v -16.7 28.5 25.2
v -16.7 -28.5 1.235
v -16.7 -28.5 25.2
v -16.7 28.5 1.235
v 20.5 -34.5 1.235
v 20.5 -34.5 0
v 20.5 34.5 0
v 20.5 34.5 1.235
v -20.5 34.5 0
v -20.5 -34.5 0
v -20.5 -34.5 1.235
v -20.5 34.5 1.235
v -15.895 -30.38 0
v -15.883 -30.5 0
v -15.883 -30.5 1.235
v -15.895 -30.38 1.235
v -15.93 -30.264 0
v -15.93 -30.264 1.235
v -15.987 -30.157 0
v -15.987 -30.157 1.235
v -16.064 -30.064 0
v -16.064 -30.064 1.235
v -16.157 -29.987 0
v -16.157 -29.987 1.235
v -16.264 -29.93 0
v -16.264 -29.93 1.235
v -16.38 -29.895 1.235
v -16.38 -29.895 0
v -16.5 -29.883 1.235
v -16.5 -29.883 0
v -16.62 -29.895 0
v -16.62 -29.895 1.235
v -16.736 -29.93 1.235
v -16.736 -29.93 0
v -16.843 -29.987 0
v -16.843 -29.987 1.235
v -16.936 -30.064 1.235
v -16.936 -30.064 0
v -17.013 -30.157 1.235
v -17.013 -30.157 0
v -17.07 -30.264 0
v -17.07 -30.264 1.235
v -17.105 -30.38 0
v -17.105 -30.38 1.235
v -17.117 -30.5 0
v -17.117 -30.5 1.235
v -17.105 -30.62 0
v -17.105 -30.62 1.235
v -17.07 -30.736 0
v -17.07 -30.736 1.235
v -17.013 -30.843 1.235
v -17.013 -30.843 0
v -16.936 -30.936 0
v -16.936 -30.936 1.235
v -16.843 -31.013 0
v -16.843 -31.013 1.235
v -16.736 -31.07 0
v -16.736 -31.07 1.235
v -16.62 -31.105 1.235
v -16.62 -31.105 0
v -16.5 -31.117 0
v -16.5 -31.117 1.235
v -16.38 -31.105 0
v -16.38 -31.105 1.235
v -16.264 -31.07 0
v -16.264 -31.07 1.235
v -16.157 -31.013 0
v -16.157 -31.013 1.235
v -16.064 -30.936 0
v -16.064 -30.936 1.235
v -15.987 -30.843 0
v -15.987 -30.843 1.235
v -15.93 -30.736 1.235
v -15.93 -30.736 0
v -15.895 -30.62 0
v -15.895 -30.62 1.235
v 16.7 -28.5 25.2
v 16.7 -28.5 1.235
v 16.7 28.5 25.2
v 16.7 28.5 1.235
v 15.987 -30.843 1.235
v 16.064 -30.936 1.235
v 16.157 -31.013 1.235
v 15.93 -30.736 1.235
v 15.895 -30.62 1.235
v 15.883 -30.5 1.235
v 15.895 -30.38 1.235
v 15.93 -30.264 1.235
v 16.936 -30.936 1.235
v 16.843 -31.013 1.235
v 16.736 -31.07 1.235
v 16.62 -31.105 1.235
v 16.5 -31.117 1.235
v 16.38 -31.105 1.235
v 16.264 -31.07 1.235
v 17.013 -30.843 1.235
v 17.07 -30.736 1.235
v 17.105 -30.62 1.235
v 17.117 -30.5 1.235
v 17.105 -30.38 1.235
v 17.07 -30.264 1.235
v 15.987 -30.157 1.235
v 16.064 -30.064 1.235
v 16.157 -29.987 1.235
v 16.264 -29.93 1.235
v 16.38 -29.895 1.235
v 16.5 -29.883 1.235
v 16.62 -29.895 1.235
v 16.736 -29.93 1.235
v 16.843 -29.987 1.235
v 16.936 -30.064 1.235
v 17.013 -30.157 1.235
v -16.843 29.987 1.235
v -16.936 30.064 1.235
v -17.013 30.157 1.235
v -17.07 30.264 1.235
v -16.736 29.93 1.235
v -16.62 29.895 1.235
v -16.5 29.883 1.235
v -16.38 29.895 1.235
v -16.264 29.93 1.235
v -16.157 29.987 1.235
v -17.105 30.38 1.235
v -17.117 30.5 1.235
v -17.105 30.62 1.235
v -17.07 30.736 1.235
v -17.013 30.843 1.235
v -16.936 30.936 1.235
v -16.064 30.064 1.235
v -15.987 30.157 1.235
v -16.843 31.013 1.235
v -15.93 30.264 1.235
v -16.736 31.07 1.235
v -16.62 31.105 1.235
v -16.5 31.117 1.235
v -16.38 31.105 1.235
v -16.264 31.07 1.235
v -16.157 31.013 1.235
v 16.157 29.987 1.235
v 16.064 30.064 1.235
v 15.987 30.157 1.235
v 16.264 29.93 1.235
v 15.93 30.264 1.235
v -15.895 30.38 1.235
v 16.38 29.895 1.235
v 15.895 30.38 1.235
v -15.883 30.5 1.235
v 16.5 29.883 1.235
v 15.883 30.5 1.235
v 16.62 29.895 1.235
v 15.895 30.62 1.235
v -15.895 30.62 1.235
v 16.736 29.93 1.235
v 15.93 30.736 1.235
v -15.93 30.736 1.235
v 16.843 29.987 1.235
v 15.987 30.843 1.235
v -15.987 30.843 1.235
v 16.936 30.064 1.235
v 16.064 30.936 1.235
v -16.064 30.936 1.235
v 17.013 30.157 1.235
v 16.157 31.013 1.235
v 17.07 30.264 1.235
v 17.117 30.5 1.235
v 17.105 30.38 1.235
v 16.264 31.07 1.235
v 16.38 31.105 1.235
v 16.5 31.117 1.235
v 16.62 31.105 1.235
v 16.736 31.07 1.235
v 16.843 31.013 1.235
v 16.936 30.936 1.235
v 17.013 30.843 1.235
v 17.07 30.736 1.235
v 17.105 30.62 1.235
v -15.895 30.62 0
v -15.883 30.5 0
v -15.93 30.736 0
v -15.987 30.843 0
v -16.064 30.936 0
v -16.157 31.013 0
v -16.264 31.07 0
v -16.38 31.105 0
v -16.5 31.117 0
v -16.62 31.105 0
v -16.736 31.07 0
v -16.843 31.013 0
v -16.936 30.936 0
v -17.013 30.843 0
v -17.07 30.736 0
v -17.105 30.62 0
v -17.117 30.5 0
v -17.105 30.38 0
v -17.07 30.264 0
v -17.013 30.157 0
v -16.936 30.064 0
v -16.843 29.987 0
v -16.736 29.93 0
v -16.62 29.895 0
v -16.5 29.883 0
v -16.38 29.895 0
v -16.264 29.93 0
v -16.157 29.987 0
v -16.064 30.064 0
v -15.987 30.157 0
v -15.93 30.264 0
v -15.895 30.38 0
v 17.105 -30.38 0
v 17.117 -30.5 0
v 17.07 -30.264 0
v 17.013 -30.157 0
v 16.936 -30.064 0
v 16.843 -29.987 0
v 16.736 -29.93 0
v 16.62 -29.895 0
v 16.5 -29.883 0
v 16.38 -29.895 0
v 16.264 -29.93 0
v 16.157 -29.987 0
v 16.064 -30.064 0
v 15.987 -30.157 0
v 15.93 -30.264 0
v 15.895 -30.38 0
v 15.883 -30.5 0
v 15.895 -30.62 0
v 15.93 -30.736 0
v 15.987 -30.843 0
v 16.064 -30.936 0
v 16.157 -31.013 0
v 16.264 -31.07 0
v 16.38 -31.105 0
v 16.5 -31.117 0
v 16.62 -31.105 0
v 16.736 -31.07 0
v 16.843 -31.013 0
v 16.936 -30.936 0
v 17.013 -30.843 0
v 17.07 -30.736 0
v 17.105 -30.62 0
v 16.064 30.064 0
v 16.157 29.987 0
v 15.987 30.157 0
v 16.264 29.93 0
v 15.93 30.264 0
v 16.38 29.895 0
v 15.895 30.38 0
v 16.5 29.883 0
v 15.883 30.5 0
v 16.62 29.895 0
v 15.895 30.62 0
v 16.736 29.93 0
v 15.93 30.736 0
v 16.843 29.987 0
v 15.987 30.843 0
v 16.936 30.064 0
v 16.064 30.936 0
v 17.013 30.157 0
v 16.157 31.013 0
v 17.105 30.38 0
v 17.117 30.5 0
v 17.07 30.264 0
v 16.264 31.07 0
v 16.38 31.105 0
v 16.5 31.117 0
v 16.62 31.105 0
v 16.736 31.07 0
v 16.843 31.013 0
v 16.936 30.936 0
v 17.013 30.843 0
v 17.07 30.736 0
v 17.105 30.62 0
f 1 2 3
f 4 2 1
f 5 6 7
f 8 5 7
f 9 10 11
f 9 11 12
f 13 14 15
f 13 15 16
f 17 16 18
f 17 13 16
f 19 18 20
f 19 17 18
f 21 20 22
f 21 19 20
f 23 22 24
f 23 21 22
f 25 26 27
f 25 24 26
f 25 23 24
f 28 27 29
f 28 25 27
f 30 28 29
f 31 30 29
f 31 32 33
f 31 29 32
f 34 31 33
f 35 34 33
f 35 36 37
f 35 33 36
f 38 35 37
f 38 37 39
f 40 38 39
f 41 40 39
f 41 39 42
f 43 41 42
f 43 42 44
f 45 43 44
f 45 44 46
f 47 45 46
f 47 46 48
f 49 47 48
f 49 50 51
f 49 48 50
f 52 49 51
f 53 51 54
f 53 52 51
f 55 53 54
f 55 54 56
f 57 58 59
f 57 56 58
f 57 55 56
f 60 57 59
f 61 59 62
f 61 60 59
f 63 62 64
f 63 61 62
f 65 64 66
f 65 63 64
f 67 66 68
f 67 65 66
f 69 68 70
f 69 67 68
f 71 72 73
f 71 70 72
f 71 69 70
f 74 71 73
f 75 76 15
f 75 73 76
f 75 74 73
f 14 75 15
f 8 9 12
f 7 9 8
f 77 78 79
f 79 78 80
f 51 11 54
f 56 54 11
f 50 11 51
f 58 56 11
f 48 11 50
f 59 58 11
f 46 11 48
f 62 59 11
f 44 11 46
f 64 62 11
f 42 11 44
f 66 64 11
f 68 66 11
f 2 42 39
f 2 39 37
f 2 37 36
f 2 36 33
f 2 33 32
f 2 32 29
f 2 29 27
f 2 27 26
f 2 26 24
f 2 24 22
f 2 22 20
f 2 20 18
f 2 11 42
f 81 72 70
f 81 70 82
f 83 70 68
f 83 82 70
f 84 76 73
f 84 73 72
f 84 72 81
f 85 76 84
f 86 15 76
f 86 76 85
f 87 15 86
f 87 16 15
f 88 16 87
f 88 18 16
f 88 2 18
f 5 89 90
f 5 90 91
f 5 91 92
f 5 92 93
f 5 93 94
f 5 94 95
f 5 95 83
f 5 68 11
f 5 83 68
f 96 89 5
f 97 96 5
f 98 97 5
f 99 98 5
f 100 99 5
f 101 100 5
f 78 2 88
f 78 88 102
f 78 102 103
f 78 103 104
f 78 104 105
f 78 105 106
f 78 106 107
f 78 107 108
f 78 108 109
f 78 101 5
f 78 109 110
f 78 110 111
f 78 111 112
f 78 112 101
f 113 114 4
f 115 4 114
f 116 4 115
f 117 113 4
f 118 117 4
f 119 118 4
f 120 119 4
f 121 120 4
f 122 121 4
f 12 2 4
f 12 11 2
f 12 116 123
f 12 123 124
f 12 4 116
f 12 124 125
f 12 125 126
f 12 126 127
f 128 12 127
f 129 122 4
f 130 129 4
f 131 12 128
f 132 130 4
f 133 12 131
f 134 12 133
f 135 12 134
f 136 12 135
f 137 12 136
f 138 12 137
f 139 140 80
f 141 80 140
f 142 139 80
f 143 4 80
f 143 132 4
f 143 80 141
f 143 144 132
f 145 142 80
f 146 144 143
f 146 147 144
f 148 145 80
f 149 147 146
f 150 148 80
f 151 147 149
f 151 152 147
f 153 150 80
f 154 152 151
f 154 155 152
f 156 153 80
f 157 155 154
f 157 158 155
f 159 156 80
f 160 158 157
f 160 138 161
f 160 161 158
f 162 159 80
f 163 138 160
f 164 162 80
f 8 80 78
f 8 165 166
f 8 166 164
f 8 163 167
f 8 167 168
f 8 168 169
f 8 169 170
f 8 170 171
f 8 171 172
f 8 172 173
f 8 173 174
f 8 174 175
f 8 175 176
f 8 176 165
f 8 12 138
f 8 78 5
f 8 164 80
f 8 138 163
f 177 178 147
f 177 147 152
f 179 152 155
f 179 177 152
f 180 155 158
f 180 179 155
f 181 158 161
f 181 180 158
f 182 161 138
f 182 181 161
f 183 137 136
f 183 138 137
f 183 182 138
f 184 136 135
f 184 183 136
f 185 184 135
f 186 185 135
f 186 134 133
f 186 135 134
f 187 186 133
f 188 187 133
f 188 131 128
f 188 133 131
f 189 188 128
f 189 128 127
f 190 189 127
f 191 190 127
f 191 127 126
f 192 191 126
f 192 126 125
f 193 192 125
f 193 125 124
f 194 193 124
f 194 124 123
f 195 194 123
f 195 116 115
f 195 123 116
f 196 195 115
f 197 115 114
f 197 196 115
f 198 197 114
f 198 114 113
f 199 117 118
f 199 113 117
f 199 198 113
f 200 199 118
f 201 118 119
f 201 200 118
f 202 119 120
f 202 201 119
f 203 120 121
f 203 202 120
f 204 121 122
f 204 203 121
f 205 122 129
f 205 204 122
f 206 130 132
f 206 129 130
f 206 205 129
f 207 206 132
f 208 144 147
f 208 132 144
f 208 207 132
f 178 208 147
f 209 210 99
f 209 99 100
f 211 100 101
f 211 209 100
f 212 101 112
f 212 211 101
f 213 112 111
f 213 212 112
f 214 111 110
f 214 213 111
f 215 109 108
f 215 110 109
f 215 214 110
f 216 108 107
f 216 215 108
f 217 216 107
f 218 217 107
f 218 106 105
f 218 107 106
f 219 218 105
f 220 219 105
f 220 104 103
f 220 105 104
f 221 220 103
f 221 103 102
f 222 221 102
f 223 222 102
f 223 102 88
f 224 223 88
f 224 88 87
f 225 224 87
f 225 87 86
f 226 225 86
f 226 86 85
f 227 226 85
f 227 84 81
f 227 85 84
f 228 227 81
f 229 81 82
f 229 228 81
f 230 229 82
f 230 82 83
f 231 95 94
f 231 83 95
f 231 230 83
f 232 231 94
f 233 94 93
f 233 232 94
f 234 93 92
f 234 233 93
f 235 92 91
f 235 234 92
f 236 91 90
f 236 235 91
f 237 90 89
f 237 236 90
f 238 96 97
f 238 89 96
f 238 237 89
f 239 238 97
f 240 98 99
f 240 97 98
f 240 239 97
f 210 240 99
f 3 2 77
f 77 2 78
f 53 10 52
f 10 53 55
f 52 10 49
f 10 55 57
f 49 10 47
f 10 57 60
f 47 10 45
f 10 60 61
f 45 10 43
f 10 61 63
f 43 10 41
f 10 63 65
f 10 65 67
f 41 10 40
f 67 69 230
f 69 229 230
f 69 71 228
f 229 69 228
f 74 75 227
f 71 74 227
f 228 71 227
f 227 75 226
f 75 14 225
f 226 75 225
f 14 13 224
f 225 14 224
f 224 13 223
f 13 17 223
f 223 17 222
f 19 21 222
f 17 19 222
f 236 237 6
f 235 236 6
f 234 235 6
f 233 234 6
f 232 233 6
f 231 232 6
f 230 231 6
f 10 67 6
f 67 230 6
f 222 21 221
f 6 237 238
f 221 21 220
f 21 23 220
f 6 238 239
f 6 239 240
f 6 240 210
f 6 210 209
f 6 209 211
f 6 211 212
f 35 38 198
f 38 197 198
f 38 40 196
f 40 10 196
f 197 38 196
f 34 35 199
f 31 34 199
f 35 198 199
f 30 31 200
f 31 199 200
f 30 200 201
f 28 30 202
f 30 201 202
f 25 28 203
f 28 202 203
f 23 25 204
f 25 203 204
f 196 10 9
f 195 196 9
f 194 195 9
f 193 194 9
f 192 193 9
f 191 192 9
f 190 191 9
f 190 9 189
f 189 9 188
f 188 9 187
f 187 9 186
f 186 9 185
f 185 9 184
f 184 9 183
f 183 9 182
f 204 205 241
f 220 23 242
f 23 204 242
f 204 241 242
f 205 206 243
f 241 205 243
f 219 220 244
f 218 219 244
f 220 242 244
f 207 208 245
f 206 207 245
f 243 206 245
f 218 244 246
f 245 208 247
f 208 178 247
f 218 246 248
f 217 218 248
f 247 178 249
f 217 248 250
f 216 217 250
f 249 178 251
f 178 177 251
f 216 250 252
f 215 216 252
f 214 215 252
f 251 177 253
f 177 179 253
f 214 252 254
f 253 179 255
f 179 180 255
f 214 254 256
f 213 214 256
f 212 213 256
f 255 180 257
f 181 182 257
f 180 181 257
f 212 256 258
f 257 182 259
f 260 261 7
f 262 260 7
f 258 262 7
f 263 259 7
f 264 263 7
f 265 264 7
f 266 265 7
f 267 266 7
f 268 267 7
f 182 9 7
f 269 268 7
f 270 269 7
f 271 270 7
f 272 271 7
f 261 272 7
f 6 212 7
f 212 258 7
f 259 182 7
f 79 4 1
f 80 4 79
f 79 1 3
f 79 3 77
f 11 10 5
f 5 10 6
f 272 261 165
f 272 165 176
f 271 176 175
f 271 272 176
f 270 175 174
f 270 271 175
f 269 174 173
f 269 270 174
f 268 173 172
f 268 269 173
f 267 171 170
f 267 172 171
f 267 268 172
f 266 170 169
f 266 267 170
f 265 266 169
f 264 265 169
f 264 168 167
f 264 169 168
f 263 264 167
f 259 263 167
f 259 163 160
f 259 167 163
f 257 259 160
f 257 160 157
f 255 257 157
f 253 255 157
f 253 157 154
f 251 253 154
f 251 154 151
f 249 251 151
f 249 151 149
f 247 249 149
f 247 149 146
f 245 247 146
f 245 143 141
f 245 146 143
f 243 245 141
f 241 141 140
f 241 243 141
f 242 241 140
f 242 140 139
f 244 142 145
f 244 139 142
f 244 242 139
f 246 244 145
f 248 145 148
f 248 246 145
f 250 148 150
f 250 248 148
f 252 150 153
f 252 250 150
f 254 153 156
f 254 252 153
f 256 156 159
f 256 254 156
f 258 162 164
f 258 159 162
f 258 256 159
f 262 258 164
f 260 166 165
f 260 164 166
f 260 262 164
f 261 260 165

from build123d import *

# Parameters (mm, degrees)
BOX_SKETCH_W              = 33.4
BOX_SKETCH_H              = 57
BOX_EXTRUDE_DEPTH         = 25.2
FLANGE_SKETCH_W           = 41
FLANGE_SKETCH_H           = 69
FLANGE_EXTRUDE_DEPTH      = 1.23456789
MOUNTHOLES_CUT_DEPTH      = 48.387129054
MOUNTHOLES_CUT_DEPTH_BACK = 48.387129054
MOUNTHOLES_SKETCH_R       = 0.617283945


with BuildPart() as part:
    # box_sketch → box_extrude (new body)
    with BuildSketch(Plane.XY):
        Rectangle(BOX_SKETCH_W, BOX_SKETCH_H)
    extrude(amount=BOX_EXTRUDE_DEPTH)

    # flange_sketch → flange_extrude (add)
    with BuildSketch(Plane.XY):
        Rectangle(FLANGE_SKETCH_W, FLANGE_SKETCH_H)
    extrude(amount=FLANGE_EXTRUDE_DEPTH)

    # mountHoles_sketch → mountHoles_cut (cut, two sides: drawn at the far end of the back side and taken through both)
    with BuildSketch(Plane.XY.offset(-MOUNTHOLES_CUT_DEPTH_BACK)):
        with Locations((16.5, -30.5)):
            Circle(MOUNTHOLES_SKETCH_R)
        with Locations((16.5, 30.5)):
            Circle(MOUNTHOLES_SKETCH_R)
        with Locations((-16.5, -30.5)):
            Circle(MOUNTHOLES_SKETCH_R)
        with Locations((-16.5, 30.5)):
            Circle(MOUNTHOLES_SKETCH_R)
    extrude(amount=MOUNTHOLES_CUT_DEPTH + MOUNTHOLES_CUT_DEPTH_BACK, mode=Mode.SUBTRACT)


solid = part.part
